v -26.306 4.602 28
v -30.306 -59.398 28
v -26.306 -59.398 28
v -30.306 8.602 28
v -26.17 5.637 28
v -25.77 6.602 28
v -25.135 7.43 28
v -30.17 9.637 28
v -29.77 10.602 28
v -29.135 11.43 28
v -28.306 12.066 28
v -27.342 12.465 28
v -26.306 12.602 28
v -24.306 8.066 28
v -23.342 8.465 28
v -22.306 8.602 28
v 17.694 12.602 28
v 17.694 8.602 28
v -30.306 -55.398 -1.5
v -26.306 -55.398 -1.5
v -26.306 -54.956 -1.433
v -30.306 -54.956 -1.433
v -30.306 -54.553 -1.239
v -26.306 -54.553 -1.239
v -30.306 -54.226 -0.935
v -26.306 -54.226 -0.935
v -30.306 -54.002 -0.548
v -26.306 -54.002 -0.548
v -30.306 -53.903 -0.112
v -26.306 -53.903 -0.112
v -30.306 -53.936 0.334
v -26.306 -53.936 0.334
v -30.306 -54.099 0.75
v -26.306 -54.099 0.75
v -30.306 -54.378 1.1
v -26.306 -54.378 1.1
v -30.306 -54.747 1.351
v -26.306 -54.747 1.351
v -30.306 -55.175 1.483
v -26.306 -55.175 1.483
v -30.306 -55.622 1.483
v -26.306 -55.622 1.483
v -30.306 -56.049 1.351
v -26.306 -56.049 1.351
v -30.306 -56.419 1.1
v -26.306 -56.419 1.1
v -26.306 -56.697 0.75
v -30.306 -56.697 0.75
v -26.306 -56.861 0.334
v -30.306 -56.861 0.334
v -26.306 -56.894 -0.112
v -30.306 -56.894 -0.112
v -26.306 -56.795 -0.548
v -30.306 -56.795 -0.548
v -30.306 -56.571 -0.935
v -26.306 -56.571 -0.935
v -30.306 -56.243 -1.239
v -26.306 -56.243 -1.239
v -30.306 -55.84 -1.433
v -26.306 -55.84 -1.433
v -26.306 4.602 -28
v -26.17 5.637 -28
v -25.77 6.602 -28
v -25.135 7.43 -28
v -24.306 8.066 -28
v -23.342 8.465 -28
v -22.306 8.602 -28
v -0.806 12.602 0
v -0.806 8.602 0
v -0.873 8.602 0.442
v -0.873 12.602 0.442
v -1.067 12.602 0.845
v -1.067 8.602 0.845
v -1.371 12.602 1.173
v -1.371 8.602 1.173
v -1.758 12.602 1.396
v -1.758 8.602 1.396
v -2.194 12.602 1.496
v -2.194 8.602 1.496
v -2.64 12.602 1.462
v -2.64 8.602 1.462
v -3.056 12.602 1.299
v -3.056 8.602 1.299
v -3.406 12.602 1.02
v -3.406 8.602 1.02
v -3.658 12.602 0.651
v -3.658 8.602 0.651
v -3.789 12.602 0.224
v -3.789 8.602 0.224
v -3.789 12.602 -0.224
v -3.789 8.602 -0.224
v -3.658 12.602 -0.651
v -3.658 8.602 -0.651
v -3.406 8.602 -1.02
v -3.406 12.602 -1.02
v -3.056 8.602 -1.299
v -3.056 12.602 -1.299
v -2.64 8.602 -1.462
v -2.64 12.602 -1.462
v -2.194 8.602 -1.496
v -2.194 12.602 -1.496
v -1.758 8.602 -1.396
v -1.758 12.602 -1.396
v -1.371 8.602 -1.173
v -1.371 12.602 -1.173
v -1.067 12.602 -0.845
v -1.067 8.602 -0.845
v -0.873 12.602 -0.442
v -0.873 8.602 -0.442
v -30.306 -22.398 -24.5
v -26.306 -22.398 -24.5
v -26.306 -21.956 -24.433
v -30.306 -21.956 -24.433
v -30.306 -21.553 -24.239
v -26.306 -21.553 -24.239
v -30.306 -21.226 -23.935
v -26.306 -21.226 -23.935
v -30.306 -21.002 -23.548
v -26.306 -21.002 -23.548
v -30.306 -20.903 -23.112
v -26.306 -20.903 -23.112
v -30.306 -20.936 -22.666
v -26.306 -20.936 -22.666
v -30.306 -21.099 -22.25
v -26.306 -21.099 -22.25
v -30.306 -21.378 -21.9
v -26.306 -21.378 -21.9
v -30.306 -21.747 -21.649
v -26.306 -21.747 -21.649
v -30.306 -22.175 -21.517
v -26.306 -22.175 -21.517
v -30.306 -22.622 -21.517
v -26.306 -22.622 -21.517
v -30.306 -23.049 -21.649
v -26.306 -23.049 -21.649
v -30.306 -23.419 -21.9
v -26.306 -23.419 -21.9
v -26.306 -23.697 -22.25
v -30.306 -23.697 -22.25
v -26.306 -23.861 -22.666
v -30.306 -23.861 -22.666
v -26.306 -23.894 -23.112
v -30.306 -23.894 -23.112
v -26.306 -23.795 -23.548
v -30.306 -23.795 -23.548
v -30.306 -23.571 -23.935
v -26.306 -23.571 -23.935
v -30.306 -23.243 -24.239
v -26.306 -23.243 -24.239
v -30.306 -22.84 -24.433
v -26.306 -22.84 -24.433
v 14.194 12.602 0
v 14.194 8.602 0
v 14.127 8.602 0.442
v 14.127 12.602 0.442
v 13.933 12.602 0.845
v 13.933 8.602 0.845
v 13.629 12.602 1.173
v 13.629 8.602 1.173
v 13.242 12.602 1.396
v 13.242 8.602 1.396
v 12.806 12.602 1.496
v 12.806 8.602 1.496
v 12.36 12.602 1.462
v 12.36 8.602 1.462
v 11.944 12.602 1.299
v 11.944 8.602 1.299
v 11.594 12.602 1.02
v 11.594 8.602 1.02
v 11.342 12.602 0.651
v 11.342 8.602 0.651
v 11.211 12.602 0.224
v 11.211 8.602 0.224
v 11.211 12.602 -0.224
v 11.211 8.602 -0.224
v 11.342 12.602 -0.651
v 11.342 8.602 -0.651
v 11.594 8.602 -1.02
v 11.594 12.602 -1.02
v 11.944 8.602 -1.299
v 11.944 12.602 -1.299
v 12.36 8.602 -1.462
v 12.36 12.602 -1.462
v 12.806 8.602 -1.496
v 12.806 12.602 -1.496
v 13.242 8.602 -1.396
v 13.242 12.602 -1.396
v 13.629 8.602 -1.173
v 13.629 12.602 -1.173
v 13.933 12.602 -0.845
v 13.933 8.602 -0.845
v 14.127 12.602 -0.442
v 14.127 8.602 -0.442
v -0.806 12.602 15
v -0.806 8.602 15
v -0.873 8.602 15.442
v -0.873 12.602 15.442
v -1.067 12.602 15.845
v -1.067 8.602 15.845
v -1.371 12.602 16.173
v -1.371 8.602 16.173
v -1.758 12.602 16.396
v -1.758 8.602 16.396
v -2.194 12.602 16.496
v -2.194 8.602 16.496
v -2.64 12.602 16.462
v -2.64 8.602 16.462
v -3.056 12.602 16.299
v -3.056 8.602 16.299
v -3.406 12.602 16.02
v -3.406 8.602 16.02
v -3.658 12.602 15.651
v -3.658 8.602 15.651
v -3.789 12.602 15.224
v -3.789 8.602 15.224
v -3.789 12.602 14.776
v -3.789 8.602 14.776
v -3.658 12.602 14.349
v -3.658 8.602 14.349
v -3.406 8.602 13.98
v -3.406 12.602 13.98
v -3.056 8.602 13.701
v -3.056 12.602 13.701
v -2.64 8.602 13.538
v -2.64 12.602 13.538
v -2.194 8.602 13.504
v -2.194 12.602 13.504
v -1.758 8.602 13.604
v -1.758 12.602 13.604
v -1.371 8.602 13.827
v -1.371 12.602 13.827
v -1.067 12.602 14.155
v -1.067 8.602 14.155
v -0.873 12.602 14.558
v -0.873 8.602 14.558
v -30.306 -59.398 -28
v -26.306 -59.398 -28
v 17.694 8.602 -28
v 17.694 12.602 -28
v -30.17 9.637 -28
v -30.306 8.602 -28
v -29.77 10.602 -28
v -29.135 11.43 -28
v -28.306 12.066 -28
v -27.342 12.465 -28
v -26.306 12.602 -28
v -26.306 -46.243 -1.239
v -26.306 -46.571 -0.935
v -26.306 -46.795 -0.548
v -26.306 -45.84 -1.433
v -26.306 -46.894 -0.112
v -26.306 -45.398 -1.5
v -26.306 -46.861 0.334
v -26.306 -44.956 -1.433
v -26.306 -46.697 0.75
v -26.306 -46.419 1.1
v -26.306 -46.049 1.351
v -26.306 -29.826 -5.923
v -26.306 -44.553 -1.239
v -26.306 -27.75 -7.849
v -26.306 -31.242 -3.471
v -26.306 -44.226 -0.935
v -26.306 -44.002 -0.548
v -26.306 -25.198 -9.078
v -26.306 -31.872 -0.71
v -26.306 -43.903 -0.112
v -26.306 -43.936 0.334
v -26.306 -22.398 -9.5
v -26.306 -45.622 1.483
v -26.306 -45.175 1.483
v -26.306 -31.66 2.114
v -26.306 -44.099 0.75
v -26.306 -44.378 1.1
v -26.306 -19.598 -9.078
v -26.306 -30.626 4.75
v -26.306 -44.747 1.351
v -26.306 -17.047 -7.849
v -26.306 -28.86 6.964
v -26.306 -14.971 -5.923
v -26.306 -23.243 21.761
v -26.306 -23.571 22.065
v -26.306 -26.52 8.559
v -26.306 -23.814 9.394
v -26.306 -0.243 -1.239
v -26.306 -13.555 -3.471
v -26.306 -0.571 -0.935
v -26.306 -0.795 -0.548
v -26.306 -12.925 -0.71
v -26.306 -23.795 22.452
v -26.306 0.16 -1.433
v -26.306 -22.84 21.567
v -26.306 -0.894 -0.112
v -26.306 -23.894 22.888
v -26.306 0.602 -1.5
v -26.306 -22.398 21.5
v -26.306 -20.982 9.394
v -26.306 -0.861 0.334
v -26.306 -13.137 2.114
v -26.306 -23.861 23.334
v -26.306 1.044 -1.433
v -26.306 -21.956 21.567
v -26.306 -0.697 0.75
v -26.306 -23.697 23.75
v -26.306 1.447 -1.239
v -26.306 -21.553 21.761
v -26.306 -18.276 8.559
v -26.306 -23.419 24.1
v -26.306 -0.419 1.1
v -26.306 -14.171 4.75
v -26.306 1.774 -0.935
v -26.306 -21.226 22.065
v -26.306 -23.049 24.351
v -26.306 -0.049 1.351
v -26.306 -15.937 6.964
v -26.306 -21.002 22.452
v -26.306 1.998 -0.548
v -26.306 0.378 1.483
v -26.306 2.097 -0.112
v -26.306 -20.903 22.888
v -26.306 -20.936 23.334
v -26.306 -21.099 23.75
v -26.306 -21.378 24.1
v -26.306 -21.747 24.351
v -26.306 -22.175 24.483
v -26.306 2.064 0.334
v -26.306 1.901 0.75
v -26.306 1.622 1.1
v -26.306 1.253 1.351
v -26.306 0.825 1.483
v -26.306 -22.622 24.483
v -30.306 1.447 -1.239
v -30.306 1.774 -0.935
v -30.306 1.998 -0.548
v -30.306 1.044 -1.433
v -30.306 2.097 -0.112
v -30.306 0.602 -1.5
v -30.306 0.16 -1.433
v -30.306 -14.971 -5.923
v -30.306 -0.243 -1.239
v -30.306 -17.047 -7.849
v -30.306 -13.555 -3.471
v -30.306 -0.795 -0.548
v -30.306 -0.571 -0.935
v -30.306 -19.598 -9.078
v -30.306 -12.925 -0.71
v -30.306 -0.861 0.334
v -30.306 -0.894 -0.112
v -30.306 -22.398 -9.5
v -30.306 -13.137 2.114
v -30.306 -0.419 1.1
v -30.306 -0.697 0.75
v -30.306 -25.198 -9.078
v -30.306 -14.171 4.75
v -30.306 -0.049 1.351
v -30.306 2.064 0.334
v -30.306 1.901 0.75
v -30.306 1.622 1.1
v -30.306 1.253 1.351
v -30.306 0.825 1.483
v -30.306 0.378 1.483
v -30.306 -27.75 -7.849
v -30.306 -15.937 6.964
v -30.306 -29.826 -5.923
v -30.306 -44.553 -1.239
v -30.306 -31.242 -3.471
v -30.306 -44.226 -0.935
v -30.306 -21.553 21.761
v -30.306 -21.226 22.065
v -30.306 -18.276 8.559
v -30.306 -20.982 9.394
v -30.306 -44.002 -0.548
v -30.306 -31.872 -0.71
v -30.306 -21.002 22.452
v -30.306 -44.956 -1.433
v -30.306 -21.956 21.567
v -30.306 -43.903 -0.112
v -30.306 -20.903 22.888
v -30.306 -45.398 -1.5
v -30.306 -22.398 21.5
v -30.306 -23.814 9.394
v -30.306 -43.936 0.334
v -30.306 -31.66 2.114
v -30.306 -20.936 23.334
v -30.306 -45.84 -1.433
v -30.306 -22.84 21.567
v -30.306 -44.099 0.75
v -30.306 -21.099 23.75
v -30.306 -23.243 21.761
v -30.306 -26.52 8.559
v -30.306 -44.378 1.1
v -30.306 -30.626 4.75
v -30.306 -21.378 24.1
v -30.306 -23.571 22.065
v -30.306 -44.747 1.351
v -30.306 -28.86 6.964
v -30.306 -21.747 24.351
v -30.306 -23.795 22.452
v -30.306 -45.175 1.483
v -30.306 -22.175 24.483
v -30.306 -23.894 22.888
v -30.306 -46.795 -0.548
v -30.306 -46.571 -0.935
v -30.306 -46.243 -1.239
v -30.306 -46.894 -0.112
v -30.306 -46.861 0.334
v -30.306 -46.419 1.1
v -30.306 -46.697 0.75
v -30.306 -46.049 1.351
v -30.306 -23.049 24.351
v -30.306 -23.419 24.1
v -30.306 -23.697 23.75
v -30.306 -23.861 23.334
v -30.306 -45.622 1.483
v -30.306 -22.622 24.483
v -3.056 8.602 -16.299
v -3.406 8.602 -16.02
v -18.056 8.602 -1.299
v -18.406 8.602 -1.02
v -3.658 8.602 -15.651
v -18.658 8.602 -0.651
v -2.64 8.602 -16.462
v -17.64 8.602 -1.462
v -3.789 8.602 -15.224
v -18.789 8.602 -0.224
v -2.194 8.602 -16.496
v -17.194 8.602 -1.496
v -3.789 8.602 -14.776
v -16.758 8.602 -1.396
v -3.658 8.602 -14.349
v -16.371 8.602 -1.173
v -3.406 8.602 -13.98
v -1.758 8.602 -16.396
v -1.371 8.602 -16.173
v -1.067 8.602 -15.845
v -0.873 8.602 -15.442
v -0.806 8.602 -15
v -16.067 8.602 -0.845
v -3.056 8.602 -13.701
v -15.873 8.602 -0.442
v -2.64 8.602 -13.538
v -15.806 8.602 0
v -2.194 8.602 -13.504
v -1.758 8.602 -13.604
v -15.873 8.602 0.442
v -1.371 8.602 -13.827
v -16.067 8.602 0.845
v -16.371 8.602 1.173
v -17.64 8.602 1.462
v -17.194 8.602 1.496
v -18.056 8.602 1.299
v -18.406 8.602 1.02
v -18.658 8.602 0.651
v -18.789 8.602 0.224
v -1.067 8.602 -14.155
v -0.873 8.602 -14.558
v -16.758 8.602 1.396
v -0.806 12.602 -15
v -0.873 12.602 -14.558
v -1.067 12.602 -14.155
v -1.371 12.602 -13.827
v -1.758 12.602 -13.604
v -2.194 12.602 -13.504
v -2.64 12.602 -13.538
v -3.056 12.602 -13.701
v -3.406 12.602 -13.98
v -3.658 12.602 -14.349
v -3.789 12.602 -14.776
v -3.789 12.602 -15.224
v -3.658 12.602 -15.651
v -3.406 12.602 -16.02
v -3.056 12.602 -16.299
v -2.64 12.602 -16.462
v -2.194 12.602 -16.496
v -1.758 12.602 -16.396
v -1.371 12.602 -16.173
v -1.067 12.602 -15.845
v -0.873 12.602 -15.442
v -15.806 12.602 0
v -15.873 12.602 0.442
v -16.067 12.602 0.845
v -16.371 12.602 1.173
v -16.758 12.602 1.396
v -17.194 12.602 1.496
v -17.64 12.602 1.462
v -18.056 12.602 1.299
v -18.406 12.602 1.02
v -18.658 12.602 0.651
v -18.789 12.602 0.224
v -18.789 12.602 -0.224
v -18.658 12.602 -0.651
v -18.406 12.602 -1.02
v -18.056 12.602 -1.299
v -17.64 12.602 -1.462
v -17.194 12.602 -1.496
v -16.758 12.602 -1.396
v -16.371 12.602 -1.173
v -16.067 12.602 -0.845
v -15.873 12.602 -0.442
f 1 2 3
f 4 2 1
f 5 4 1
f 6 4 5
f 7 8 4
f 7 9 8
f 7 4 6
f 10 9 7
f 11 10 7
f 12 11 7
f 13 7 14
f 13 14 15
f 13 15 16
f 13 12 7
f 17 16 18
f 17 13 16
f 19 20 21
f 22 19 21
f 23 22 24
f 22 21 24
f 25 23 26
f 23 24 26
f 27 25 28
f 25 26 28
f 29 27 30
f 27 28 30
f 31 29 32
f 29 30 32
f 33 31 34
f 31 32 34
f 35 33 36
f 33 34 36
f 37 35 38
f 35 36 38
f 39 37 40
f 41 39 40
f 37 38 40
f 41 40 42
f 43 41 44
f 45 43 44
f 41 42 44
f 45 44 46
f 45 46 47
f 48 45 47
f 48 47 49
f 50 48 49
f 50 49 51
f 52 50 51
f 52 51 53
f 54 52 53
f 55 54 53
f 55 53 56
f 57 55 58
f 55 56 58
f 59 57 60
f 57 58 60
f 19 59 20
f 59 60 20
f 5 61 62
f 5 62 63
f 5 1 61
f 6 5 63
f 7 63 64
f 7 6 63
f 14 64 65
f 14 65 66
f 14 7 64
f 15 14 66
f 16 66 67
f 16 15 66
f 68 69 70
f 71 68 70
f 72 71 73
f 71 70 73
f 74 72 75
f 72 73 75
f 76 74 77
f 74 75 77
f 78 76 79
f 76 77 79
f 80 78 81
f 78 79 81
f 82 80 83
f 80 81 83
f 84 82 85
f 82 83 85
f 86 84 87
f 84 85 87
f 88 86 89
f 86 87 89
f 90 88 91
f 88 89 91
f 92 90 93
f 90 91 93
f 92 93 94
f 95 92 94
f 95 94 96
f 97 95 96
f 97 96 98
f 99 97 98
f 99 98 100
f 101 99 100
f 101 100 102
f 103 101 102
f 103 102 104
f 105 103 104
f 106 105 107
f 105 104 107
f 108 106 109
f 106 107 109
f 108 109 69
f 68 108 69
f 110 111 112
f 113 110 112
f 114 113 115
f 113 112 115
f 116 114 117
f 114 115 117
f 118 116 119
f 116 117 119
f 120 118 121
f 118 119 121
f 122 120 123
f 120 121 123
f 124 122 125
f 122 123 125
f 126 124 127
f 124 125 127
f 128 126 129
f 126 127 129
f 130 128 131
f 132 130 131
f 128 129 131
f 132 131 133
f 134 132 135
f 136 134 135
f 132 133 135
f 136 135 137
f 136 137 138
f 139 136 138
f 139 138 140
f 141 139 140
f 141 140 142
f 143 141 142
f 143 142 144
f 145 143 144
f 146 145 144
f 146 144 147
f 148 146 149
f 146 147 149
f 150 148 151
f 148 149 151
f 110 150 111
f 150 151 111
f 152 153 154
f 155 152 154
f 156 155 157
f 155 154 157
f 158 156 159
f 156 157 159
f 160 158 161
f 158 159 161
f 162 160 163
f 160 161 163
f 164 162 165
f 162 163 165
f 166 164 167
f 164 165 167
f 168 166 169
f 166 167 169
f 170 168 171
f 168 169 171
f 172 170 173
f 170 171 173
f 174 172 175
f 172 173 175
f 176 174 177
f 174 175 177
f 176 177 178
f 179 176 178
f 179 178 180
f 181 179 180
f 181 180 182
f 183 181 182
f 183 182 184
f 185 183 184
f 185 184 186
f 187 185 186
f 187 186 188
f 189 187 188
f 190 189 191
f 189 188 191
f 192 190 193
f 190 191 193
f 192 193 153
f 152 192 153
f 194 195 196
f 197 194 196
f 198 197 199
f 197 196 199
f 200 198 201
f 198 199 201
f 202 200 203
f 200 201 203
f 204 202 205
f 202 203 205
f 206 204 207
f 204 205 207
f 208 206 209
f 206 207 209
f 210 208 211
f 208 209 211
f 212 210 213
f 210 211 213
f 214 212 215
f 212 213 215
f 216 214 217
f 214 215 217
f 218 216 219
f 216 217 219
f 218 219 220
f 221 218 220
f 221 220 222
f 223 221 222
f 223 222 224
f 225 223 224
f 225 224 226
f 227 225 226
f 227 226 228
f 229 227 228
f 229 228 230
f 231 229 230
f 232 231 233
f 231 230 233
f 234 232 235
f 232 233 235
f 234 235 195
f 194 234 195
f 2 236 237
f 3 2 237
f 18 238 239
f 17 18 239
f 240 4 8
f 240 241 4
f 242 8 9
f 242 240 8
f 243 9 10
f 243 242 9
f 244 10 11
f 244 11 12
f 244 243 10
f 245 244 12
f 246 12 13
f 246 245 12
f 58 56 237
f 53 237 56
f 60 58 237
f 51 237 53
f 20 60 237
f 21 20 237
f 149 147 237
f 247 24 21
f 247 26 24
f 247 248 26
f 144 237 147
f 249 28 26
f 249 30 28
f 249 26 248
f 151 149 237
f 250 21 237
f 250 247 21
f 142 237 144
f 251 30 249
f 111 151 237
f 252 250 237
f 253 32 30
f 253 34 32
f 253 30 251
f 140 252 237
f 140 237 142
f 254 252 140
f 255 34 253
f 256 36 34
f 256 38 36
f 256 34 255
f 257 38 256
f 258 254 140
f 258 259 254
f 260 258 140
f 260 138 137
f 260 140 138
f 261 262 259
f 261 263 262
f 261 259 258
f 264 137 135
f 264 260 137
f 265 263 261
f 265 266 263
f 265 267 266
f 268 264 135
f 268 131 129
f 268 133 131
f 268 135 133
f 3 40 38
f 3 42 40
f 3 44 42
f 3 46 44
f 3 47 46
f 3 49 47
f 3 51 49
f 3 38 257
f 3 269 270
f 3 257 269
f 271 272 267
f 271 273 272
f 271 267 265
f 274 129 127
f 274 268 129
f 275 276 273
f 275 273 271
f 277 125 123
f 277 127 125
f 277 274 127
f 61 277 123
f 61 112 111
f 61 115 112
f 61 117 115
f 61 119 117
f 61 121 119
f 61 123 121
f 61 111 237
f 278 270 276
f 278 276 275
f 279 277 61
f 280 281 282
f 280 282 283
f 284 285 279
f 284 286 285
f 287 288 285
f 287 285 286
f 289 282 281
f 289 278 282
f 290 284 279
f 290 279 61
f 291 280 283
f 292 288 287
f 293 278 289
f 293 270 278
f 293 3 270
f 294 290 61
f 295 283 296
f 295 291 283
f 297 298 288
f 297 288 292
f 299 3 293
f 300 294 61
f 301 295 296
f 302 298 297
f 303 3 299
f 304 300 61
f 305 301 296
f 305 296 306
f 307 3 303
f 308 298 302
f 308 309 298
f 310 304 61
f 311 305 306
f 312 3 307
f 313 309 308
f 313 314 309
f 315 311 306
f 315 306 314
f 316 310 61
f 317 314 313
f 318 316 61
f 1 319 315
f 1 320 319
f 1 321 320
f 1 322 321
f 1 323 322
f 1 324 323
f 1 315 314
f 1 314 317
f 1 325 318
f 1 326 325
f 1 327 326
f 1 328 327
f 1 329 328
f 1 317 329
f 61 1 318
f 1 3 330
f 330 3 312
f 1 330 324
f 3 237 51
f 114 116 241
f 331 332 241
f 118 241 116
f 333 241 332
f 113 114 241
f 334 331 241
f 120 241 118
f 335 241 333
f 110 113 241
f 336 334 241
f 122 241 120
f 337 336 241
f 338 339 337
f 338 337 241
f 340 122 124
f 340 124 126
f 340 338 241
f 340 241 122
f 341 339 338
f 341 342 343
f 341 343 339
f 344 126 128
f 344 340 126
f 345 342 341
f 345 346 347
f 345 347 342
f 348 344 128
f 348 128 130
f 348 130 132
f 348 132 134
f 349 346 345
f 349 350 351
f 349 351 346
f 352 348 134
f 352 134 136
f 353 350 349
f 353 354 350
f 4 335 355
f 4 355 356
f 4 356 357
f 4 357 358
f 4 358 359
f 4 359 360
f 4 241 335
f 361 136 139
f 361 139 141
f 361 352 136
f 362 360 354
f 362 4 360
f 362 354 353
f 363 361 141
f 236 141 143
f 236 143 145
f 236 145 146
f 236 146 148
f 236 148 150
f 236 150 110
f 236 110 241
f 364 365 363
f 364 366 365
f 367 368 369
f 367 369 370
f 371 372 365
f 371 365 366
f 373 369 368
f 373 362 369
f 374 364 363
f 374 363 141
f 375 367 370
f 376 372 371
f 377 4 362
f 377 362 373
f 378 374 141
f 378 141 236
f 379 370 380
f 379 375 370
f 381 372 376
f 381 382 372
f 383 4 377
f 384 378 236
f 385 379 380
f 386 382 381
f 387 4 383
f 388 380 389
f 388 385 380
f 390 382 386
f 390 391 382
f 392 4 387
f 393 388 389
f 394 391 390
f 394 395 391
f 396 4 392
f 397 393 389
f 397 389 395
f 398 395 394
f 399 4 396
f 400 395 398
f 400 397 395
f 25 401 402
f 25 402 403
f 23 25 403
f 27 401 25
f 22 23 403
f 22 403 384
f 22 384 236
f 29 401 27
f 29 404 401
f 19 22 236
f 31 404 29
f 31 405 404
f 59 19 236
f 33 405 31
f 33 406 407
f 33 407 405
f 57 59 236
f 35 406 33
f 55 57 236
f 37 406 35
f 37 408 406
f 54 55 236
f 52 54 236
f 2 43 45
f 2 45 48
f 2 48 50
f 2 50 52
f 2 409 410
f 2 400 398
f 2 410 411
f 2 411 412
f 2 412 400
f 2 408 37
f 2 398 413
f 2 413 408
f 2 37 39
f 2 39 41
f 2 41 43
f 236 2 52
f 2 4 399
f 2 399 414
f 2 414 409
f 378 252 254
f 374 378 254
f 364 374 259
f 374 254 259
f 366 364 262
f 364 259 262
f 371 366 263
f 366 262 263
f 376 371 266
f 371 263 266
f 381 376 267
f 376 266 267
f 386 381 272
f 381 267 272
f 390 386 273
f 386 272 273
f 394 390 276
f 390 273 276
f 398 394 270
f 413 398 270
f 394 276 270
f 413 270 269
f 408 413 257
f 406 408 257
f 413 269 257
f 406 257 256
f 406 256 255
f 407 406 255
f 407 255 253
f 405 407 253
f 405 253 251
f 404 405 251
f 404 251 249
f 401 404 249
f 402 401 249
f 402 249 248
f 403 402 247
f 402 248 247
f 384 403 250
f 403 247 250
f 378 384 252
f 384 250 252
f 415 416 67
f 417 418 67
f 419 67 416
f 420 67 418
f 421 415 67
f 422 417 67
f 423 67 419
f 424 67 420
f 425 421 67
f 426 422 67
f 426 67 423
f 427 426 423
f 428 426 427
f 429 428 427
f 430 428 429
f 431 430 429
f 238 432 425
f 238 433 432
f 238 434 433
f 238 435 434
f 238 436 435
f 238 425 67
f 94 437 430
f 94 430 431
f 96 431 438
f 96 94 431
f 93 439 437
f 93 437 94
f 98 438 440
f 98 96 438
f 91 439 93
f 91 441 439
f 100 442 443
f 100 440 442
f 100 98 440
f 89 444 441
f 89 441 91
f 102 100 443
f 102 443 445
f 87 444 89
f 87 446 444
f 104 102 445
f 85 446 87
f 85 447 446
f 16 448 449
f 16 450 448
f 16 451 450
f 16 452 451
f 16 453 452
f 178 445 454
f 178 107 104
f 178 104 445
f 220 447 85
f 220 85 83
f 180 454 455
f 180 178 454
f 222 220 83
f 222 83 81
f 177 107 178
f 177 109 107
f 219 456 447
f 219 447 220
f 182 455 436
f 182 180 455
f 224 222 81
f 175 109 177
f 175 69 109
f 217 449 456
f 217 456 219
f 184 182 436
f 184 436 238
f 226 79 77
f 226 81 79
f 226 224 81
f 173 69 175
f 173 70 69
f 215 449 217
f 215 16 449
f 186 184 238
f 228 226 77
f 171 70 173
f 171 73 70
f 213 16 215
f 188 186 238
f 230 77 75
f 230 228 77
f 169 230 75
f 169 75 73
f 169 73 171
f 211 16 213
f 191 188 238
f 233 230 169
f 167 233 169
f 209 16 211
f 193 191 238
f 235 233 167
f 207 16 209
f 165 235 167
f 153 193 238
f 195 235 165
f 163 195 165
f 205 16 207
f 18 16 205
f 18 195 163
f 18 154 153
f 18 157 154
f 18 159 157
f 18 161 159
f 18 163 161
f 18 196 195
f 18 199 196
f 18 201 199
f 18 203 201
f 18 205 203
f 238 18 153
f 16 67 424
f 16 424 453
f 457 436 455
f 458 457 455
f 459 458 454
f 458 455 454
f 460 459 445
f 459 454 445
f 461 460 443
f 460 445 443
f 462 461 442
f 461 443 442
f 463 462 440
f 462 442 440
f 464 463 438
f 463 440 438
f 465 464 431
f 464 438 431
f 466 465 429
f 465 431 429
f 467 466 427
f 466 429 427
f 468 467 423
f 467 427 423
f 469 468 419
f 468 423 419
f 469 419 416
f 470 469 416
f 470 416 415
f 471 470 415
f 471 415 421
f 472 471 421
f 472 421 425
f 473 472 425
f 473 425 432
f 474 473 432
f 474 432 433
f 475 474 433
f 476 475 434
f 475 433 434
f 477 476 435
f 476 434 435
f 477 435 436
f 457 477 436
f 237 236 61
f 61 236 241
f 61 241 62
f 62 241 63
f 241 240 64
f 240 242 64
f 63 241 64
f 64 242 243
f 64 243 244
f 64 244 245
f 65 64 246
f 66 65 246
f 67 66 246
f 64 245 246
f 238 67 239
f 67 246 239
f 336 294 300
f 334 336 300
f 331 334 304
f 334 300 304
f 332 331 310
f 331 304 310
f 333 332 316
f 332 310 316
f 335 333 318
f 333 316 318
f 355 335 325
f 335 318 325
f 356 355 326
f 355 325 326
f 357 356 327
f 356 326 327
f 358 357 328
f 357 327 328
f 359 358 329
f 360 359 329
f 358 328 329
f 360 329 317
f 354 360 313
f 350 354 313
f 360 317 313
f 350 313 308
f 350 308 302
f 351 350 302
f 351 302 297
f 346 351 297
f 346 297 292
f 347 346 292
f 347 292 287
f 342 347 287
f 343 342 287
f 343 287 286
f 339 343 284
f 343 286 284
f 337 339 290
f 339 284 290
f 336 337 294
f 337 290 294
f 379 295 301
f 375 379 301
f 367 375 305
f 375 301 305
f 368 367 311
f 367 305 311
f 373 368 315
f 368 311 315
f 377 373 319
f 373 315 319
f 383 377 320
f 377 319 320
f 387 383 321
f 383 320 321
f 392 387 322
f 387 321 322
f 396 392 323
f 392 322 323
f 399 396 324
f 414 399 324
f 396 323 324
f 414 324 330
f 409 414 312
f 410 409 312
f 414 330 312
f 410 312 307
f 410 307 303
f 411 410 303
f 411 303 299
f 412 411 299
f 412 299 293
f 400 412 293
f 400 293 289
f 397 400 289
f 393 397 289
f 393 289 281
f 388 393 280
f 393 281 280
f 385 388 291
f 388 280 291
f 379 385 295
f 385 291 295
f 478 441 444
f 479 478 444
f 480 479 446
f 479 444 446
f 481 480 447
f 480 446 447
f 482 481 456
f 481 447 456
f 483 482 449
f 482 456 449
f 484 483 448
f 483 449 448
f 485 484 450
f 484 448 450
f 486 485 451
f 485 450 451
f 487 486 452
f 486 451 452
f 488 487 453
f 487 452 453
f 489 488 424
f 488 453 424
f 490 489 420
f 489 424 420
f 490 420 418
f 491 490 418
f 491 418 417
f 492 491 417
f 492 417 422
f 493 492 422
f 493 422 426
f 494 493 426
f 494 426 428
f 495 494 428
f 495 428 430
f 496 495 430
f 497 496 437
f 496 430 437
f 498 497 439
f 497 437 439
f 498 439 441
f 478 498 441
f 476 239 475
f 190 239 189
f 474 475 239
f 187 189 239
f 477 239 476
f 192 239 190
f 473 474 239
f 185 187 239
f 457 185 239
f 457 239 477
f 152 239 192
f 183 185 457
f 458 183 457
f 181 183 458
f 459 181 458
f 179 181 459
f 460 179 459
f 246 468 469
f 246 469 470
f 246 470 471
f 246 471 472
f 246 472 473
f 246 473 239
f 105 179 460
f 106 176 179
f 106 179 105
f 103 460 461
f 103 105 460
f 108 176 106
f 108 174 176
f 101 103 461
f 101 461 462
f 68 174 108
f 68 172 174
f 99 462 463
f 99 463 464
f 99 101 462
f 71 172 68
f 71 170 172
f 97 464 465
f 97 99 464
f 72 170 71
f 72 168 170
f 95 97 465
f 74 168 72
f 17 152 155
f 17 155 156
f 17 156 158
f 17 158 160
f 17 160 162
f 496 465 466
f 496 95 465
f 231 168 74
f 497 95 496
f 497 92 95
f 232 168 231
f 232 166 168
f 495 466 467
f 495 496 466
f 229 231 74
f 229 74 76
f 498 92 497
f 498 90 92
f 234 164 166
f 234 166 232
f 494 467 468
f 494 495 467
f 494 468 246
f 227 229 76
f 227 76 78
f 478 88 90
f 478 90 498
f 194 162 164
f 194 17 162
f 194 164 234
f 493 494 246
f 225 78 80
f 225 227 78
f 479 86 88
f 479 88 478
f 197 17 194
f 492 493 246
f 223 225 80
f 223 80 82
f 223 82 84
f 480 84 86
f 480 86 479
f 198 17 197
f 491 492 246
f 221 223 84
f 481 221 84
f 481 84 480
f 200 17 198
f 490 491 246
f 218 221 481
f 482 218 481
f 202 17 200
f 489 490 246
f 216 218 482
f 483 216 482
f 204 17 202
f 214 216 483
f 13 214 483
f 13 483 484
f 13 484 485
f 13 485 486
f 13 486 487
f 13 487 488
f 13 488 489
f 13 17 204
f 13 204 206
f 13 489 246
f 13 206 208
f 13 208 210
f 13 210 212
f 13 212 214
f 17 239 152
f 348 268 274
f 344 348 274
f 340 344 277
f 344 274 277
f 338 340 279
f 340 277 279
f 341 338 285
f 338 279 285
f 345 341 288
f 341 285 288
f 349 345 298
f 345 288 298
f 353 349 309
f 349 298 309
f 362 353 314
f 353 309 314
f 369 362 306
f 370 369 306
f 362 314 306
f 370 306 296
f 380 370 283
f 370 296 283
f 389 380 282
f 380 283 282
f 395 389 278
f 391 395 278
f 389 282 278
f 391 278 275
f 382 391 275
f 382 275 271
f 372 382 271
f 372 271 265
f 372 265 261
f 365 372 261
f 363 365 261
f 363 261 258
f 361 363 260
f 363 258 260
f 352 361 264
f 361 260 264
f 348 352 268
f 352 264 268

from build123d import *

# Parameters (mm, degrees)
BOSS_EXTRUDE1_DEPTH      = 28
BOSS_EXTRUDE1_DEPTH_BACK = 28
SKETCH3_R                = 9.5
SKETCH3_R_2              = 1.5
CUT_EXTRUDE1_DEPTH       = 4
FILLET2_R                = 4
SKETCH4_R                = 1.5
CUT_EXTRUDE2_DEPTH       = 4


with BuildPart() as part:
    # Sketch2 → Boss-Extrude1 (new body, two sides)
    with BuildSketch(Plane.XY) as boss_extrude1_sk:
        Polygon((-30.306244844, -59.398325359), (-26.306244844, -59.398325359), (-26.306244844, 8.601674641), (17.693755156, 8.601674641), (17.693755156, 12.601674641), (-30.306244844, 12.601674641), align=None)
    extrude(amount=BOSS_EXTRUDE1_DEPTH)
    extrude(boss_extrude1_sk.sketch, amount=-BOSS_EXTRUDE1_DEPTH_BACK)

    # Sketch3 → Cut-Extrude1 (cut)
    with BuildSketch(Plane(origin=(-26.306244844, 0, 0), x_dir=(0, 0, -1), z_dir=(1, 0, 0))):
        with Locations((0, -22.398325359)):
            Circle(SKETCH3_R)
        with Locations((0, 0.601674641)):
            Circle(SKETCH3_R_2)
        with Locations((23, -22.398325359)):
            Circle(SKETCH3_R_2)
        with Locations((0, -45.398325359)):
            Circle(SKETCH3_R_2)
        with Locations((-23, -22.398325359)):
            Circle(SKETCH3_R_2)
        with Locations((0, -55.398325359)):
            Circle(SKETCH3_R_2)
    extrude(amount=-CUT_EXTRUDE1_DEPTH, mode=Mode.SUBTRACT)

    # Fillet2
    fillet2_edges = [part.edges().sort_by_distance(p)[0] for p in [
        (-30.306244844, 12.601674641, 0),
        (-26.306244844, 8.601674641, 0),
    ]]
    fillet(fillet2_edges, radius=FILLET2_R)

    # Sketch4 → Cut-Extrude2 (cut)
    with BuildSketch(Plane.XZ.offset(-8.601674641)):
        with Locations((-2.306244844, 0)):
            Circle(SKETCH4_R)
        with Locations((-17.306244844, 0)):
            Circle(SKETCH4_R)
        with Locations((-2.306244844, 15)):
            Circle(SKETCH4_R)
        with Locations((12.693755156, 0)):
            Circle(SKETCH4_R)
        with Locations((-2.306244844, -15)):
            Circle(SKETCH4_R)
    extrude(amount=-CUT_EXTRUDE2_DEPTH, mode=Mode.SUBTRACT)


solid = part.part
